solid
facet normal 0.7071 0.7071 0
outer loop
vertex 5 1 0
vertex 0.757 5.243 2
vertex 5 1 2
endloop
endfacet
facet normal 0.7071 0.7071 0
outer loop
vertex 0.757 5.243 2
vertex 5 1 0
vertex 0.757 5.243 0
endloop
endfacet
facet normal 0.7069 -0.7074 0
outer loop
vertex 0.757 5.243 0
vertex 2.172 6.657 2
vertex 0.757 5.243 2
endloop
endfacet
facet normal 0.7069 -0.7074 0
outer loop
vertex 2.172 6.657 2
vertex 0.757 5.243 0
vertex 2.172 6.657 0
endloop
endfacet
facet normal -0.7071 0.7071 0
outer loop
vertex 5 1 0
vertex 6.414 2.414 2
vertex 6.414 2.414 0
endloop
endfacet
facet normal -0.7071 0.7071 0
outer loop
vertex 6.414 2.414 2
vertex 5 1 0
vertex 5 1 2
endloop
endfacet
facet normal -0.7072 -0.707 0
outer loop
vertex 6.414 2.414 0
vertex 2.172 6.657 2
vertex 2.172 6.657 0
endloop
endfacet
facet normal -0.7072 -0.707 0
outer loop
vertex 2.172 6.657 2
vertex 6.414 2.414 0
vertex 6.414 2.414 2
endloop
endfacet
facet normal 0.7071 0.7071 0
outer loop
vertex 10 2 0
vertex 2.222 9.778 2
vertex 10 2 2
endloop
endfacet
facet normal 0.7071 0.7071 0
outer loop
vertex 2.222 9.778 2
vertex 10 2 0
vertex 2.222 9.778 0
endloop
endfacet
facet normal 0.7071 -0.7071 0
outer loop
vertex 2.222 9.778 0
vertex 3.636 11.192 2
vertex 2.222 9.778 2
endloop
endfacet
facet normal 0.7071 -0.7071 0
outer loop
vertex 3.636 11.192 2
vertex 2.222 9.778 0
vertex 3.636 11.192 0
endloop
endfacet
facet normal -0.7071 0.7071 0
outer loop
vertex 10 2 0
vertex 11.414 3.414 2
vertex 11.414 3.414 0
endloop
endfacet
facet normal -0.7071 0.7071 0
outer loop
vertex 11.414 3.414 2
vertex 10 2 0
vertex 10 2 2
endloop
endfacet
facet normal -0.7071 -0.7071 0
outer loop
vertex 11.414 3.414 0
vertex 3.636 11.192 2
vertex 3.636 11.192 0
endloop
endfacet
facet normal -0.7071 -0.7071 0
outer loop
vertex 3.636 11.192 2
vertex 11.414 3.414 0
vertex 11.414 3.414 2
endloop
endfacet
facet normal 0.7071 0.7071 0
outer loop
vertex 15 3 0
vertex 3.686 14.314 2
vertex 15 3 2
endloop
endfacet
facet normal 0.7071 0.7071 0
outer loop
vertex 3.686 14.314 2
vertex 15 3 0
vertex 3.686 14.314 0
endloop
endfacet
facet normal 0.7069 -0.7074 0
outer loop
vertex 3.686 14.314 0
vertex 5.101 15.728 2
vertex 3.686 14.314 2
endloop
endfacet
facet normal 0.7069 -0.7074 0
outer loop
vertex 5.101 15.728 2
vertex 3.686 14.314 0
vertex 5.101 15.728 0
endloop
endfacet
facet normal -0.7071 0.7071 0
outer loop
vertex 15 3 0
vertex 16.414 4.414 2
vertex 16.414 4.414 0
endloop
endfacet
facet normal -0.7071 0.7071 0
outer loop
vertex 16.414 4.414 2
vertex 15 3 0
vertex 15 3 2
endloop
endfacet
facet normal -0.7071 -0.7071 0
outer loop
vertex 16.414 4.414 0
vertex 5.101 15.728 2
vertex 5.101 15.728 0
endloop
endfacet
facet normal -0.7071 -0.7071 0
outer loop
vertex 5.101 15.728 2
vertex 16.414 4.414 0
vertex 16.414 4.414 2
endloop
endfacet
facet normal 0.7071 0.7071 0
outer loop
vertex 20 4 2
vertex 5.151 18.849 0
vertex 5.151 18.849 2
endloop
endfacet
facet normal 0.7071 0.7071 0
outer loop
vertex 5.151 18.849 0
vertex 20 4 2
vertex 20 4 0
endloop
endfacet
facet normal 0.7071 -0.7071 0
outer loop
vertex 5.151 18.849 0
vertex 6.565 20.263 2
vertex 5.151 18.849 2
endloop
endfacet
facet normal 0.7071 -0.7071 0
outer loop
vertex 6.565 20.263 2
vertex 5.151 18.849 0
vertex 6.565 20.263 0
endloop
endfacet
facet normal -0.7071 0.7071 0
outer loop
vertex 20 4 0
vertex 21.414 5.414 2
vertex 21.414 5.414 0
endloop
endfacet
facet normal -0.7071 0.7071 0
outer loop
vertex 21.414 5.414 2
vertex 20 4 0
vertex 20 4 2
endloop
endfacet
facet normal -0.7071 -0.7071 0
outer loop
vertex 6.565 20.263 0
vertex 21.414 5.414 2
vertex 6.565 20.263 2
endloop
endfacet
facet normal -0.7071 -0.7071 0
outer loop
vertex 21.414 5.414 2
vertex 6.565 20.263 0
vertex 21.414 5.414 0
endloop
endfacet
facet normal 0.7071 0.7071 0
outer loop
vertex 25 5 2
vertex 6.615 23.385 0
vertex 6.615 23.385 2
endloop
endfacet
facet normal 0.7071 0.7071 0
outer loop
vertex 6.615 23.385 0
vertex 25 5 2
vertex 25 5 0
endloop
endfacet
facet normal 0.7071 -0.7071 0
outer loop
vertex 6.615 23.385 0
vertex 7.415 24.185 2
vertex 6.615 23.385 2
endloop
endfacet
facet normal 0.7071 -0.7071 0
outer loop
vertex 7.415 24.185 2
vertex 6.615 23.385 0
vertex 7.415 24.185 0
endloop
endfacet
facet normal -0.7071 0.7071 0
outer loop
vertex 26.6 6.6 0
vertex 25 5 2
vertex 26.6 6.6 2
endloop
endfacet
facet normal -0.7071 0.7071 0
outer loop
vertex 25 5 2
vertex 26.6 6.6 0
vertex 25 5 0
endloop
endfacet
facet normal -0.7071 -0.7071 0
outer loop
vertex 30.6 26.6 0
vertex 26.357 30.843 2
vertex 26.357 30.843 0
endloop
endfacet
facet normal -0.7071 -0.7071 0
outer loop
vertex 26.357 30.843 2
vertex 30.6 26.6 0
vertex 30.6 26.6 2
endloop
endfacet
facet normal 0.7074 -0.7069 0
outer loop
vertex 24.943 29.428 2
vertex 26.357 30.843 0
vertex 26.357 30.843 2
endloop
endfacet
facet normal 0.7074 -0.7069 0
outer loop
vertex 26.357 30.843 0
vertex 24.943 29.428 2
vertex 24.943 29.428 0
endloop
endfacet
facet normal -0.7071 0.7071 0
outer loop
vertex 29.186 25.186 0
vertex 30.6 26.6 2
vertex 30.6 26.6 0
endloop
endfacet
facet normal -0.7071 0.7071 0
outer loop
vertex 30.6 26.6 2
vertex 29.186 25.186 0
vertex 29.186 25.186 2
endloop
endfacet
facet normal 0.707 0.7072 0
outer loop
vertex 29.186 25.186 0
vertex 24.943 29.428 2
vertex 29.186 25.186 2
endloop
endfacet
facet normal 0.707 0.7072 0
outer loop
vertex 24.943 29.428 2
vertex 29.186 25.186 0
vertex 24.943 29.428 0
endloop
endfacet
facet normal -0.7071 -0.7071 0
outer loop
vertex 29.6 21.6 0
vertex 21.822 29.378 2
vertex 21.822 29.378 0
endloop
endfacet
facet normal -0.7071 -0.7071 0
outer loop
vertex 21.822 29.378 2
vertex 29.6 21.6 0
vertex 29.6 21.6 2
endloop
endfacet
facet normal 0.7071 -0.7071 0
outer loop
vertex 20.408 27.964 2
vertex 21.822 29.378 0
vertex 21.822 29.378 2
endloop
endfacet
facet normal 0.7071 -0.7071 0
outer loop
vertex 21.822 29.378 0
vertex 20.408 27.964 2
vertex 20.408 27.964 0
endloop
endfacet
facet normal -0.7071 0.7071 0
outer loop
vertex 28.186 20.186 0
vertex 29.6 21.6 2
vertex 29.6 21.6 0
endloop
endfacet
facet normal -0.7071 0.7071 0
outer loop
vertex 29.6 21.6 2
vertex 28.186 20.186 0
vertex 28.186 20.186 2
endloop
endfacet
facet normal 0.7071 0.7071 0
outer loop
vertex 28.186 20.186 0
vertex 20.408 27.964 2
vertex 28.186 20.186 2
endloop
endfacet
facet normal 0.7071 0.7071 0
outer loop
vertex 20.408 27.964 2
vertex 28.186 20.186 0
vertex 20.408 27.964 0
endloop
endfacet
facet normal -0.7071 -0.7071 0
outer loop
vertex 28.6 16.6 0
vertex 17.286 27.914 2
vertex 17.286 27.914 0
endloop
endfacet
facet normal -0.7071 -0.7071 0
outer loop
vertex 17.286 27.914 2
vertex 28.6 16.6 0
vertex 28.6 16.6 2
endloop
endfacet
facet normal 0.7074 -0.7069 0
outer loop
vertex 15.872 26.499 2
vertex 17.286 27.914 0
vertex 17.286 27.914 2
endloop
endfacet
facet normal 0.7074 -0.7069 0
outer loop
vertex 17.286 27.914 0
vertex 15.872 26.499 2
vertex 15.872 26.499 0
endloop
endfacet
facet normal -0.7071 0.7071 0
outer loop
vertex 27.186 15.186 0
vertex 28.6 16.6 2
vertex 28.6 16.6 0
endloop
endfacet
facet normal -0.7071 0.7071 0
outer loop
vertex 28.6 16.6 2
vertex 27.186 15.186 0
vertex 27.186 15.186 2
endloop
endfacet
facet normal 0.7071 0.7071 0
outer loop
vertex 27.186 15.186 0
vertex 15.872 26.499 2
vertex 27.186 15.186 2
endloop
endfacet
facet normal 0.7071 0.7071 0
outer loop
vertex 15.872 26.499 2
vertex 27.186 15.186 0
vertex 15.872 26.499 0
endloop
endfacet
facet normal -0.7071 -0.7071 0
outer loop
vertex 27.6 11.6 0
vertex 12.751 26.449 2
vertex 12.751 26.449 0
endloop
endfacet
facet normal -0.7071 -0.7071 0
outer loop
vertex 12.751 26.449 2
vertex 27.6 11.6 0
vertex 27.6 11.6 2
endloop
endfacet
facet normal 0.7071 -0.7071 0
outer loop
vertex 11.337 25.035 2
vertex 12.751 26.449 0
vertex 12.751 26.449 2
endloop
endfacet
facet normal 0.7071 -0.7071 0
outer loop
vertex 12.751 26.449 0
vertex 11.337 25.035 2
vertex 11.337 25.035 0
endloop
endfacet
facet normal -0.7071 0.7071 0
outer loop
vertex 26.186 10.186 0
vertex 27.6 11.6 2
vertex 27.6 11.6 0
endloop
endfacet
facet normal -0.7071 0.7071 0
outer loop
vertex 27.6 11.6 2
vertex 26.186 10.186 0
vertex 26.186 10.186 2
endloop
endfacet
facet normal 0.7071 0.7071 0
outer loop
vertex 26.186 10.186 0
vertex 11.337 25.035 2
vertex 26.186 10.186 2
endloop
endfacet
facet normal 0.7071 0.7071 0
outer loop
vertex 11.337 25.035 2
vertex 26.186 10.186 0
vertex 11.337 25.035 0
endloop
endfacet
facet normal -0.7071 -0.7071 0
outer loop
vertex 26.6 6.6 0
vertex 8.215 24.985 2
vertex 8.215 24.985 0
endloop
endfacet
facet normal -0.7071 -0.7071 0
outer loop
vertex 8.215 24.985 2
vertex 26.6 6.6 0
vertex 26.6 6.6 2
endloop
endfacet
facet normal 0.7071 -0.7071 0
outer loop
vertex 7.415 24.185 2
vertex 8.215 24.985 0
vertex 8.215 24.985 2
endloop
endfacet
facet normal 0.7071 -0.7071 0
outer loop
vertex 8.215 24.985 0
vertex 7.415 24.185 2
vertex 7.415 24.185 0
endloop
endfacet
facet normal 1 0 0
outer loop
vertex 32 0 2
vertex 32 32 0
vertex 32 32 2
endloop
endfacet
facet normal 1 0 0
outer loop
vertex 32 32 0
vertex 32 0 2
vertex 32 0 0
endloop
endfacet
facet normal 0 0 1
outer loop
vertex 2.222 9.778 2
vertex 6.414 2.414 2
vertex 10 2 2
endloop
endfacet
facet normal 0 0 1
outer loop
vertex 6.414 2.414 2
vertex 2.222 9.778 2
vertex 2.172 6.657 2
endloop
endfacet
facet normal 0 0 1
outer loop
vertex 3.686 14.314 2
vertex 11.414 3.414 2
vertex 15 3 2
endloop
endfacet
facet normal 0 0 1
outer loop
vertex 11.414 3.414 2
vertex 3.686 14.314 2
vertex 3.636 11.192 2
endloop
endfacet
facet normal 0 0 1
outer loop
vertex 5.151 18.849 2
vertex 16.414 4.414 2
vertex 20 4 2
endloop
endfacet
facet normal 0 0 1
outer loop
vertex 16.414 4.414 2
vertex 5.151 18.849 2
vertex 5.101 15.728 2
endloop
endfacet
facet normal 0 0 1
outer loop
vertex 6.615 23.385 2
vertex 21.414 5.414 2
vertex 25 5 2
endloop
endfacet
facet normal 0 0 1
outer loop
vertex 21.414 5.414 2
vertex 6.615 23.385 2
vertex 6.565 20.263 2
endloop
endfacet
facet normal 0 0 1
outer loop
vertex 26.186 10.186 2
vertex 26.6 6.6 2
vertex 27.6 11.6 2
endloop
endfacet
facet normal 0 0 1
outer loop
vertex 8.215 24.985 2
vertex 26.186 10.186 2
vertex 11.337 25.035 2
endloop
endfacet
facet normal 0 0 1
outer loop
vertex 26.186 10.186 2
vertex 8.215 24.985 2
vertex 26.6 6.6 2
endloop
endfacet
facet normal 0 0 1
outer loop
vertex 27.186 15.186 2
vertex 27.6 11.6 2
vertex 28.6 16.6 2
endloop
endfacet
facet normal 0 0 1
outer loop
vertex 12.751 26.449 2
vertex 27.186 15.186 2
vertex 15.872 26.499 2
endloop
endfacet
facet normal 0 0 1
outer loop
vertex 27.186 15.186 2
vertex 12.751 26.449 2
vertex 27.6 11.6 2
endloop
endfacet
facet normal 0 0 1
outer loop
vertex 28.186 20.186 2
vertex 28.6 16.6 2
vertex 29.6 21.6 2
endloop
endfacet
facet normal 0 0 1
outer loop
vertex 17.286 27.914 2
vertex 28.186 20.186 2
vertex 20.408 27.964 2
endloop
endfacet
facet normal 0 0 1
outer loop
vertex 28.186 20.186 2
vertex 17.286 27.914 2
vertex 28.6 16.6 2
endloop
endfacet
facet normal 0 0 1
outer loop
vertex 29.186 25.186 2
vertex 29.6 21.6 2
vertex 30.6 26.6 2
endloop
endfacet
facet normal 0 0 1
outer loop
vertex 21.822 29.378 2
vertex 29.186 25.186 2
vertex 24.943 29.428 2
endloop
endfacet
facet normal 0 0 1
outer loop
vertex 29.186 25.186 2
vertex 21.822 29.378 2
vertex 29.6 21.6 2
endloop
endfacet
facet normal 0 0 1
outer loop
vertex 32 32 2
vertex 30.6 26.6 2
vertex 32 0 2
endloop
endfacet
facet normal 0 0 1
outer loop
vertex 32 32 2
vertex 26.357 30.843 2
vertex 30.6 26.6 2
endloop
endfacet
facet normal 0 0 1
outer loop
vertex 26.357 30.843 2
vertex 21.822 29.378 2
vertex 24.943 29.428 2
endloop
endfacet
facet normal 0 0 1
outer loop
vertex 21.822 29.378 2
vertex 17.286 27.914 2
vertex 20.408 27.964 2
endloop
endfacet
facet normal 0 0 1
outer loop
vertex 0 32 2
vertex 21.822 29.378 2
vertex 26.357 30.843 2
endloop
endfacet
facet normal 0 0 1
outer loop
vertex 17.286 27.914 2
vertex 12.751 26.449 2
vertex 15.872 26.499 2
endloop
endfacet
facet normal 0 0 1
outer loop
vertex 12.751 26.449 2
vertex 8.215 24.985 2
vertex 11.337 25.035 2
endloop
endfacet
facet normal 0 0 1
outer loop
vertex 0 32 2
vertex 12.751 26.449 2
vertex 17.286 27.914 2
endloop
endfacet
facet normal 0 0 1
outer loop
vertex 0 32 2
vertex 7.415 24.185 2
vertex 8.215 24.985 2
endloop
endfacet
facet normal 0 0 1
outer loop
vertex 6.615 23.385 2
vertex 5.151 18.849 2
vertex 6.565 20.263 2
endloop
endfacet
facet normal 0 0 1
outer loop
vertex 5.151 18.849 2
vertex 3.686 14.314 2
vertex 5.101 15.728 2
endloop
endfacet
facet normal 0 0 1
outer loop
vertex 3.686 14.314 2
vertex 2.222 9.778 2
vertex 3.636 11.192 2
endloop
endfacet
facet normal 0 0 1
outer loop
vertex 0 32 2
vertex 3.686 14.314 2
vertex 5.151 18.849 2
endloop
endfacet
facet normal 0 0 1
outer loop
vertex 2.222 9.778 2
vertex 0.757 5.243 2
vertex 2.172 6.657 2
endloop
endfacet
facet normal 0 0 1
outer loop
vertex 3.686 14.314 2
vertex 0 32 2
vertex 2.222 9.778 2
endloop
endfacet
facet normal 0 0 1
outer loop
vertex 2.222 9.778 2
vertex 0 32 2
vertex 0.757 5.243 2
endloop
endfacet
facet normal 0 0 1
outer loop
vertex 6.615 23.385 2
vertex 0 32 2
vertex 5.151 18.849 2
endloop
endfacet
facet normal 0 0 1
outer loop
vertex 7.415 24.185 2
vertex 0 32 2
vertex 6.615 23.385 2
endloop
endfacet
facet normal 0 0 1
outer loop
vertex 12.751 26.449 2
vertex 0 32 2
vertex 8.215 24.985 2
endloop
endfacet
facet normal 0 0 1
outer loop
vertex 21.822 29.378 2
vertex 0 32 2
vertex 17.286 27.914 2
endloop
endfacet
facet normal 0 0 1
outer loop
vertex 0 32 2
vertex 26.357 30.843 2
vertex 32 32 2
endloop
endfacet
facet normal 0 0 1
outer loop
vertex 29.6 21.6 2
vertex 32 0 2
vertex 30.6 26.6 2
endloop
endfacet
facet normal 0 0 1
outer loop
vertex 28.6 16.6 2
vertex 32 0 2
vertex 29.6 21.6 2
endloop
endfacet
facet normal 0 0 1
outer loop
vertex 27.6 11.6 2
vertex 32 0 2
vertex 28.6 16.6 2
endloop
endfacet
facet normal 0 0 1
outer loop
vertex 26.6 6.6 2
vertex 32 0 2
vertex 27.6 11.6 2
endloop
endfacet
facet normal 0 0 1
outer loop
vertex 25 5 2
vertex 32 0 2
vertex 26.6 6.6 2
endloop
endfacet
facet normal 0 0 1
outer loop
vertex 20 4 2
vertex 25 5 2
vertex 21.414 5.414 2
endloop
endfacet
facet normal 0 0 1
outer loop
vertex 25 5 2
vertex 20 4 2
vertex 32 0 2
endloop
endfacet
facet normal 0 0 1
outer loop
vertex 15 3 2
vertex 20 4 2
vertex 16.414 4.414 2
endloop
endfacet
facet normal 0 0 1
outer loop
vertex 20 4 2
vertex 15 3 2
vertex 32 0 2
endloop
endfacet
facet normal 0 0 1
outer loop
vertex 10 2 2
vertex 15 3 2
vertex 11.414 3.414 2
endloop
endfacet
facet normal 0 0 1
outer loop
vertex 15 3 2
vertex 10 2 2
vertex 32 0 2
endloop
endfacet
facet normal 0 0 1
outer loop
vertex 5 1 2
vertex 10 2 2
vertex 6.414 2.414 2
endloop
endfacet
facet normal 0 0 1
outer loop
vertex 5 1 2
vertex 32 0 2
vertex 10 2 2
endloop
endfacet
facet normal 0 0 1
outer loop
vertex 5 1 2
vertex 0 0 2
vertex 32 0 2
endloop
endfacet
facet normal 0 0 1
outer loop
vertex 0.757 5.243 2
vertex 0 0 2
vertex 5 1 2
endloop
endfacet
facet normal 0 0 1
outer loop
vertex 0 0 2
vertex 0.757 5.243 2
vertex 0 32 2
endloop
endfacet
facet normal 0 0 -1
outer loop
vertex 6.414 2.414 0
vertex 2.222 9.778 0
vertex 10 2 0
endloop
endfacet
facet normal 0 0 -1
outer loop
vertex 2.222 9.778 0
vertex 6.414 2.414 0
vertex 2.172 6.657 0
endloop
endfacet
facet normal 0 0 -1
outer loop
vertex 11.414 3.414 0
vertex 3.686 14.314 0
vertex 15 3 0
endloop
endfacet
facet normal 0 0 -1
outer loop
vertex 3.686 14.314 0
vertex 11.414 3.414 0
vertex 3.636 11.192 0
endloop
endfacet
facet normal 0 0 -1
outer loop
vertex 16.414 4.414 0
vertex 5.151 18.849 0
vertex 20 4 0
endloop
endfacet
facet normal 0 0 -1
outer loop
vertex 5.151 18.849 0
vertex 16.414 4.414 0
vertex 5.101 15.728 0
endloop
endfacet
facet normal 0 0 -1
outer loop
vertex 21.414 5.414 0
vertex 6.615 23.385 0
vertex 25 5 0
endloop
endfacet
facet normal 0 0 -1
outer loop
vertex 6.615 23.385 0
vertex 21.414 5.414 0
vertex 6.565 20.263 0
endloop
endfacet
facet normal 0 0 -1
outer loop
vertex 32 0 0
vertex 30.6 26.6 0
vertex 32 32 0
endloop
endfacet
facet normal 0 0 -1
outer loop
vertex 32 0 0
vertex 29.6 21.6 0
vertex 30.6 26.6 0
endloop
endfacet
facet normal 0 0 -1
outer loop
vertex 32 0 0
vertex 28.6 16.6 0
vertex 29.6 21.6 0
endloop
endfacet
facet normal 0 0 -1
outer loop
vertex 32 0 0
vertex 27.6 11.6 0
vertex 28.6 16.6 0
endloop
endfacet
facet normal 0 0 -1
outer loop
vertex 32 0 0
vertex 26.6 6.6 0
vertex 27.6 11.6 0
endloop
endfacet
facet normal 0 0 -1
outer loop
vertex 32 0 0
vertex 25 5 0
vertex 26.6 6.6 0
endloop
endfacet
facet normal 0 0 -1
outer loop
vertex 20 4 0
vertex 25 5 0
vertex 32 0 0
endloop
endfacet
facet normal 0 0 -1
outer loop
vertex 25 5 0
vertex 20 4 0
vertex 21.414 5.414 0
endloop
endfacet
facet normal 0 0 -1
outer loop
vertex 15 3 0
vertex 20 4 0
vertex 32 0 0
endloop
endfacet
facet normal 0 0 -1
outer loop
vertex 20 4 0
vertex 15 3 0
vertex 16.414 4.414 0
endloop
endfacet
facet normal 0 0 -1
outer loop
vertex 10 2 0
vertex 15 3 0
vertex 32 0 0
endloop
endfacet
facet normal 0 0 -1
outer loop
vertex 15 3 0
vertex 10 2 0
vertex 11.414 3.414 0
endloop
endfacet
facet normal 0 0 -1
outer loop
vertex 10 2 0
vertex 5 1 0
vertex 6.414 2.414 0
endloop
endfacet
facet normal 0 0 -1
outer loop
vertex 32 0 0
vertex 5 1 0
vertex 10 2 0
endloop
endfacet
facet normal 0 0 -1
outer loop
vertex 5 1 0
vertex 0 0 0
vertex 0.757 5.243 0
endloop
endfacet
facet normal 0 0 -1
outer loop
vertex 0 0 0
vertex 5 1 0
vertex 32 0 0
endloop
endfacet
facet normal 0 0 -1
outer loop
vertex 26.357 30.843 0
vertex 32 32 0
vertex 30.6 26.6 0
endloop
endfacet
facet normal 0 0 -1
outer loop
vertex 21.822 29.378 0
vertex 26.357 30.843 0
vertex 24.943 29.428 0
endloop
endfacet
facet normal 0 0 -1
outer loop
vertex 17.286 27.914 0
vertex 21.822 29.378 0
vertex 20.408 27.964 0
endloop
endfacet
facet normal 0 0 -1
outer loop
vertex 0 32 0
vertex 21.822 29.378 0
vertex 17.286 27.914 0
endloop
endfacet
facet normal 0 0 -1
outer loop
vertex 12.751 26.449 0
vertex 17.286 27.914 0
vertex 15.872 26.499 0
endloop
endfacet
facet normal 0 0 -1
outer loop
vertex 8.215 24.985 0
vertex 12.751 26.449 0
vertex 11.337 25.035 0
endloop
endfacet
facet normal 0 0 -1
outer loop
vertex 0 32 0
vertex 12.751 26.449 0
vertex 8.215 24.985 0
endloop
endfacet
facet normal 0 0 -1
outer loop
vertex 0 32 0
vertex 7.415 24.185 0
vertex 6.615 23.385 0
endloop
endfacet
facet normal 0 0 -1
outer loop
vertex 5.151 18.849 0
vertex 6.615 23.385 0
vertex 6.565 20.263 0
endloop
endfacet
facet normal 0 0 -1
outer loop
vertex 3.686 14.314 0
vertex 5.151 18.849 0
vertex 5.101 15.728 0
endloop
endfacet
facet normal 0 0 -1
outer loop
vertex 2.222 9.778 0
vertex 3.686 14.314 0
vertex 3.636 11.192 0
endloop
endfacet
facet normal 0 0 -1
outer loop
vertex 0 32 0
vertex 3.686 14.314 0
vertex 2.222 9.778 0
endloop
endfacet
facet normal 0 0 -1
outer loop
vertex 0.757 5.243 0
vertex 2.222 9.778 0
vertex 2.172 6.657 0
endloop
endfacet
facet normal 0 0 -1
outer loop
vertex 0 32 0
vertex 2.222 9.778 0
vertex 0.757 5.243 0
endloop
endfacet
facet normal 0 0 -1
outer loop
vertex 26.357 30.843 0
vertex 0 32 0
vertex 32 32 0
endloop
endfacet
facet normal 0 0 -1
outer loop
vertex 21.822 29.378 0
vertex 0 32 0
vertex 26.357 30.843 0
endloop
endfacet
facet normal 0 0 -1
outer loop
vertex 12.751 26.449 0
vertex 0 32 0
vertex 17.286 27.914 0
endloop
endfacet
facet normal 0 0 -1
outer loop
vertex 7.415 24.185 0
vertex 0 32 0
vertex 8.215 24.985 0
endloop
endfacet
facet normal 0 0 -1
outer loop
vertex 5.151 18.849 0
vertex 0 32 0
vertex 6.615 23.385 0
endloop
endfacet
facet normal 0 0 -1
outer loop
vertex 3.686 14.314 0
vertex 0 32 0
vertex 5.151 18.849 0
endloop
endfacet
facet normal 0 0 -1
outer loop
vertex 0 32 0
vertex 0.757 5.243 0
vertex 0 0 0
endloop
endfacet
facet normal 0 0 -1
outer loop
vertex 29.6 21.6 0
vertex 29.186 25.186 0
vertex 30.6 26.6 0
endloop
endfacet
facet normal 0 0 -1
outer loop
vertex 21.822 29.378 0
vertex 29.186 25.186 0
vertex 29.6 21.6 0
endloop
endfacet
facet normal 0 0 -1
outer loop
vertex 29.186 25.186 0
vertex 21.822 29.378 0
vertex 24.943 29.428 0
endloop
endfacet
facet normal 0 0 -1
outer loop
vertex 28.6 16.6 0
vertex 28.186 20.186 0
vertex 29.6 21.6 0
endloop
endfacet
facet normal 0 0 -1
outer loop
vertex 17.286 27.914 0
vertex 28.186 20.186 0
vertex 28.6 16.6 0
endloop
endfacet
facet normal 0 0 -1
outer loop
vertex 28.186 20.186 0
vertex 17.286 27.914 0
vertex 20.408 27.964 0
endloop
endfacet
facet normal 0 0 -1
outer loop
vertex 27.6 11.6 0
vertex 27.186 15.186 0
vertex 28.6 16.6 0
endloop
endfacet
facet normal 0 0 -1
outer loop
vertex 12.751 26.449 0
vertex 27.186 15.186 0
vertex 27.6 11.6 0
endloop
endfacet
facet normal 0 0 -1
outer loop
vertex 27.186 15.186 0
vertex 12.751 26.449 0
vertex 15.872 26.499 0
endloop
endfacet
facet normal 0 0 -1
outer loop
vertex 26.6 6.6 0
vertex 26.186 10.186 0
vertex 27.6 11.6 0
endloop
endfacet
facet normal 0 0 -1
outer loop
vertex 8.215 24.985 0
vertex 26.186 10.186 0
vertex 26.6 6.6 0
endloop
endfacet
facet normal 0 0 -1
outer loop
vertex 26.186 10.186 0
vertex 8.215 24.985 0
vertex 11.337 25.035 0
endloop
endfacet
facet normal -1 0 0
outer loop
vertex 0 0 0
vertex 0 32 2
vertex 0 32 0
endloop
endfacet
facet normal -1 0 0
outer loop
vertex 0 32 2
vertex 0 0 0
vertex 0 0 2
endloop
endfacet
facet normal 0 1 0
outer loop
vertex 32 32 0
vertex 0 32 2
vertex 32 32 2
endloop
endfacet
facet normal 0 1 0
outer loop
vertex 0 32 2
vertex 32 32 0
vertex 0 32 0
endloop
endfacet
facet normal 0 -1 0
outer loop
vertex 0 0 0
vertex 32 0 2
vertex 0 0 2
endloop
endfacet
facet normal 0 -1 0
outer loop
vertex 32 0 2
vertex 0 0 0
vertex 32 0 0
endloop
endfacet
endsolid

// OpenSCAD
difference(){
  cube([32,32,2]);
    color("Green")
for(i=[1:5]){
    translate([i*5,i,-1]){
        rotate(45){
        cube([2,1+(i*5),5]);
            }}}
translate([31.6,31.6,0]){
mirror([10, 10, 0]){
    for(i=[1:5]){
        color("Red")
    translate([i*5,i,-1]){
        rotate(45){
        cube([2,1+(i*5),5]);
            }}}}}}
        
